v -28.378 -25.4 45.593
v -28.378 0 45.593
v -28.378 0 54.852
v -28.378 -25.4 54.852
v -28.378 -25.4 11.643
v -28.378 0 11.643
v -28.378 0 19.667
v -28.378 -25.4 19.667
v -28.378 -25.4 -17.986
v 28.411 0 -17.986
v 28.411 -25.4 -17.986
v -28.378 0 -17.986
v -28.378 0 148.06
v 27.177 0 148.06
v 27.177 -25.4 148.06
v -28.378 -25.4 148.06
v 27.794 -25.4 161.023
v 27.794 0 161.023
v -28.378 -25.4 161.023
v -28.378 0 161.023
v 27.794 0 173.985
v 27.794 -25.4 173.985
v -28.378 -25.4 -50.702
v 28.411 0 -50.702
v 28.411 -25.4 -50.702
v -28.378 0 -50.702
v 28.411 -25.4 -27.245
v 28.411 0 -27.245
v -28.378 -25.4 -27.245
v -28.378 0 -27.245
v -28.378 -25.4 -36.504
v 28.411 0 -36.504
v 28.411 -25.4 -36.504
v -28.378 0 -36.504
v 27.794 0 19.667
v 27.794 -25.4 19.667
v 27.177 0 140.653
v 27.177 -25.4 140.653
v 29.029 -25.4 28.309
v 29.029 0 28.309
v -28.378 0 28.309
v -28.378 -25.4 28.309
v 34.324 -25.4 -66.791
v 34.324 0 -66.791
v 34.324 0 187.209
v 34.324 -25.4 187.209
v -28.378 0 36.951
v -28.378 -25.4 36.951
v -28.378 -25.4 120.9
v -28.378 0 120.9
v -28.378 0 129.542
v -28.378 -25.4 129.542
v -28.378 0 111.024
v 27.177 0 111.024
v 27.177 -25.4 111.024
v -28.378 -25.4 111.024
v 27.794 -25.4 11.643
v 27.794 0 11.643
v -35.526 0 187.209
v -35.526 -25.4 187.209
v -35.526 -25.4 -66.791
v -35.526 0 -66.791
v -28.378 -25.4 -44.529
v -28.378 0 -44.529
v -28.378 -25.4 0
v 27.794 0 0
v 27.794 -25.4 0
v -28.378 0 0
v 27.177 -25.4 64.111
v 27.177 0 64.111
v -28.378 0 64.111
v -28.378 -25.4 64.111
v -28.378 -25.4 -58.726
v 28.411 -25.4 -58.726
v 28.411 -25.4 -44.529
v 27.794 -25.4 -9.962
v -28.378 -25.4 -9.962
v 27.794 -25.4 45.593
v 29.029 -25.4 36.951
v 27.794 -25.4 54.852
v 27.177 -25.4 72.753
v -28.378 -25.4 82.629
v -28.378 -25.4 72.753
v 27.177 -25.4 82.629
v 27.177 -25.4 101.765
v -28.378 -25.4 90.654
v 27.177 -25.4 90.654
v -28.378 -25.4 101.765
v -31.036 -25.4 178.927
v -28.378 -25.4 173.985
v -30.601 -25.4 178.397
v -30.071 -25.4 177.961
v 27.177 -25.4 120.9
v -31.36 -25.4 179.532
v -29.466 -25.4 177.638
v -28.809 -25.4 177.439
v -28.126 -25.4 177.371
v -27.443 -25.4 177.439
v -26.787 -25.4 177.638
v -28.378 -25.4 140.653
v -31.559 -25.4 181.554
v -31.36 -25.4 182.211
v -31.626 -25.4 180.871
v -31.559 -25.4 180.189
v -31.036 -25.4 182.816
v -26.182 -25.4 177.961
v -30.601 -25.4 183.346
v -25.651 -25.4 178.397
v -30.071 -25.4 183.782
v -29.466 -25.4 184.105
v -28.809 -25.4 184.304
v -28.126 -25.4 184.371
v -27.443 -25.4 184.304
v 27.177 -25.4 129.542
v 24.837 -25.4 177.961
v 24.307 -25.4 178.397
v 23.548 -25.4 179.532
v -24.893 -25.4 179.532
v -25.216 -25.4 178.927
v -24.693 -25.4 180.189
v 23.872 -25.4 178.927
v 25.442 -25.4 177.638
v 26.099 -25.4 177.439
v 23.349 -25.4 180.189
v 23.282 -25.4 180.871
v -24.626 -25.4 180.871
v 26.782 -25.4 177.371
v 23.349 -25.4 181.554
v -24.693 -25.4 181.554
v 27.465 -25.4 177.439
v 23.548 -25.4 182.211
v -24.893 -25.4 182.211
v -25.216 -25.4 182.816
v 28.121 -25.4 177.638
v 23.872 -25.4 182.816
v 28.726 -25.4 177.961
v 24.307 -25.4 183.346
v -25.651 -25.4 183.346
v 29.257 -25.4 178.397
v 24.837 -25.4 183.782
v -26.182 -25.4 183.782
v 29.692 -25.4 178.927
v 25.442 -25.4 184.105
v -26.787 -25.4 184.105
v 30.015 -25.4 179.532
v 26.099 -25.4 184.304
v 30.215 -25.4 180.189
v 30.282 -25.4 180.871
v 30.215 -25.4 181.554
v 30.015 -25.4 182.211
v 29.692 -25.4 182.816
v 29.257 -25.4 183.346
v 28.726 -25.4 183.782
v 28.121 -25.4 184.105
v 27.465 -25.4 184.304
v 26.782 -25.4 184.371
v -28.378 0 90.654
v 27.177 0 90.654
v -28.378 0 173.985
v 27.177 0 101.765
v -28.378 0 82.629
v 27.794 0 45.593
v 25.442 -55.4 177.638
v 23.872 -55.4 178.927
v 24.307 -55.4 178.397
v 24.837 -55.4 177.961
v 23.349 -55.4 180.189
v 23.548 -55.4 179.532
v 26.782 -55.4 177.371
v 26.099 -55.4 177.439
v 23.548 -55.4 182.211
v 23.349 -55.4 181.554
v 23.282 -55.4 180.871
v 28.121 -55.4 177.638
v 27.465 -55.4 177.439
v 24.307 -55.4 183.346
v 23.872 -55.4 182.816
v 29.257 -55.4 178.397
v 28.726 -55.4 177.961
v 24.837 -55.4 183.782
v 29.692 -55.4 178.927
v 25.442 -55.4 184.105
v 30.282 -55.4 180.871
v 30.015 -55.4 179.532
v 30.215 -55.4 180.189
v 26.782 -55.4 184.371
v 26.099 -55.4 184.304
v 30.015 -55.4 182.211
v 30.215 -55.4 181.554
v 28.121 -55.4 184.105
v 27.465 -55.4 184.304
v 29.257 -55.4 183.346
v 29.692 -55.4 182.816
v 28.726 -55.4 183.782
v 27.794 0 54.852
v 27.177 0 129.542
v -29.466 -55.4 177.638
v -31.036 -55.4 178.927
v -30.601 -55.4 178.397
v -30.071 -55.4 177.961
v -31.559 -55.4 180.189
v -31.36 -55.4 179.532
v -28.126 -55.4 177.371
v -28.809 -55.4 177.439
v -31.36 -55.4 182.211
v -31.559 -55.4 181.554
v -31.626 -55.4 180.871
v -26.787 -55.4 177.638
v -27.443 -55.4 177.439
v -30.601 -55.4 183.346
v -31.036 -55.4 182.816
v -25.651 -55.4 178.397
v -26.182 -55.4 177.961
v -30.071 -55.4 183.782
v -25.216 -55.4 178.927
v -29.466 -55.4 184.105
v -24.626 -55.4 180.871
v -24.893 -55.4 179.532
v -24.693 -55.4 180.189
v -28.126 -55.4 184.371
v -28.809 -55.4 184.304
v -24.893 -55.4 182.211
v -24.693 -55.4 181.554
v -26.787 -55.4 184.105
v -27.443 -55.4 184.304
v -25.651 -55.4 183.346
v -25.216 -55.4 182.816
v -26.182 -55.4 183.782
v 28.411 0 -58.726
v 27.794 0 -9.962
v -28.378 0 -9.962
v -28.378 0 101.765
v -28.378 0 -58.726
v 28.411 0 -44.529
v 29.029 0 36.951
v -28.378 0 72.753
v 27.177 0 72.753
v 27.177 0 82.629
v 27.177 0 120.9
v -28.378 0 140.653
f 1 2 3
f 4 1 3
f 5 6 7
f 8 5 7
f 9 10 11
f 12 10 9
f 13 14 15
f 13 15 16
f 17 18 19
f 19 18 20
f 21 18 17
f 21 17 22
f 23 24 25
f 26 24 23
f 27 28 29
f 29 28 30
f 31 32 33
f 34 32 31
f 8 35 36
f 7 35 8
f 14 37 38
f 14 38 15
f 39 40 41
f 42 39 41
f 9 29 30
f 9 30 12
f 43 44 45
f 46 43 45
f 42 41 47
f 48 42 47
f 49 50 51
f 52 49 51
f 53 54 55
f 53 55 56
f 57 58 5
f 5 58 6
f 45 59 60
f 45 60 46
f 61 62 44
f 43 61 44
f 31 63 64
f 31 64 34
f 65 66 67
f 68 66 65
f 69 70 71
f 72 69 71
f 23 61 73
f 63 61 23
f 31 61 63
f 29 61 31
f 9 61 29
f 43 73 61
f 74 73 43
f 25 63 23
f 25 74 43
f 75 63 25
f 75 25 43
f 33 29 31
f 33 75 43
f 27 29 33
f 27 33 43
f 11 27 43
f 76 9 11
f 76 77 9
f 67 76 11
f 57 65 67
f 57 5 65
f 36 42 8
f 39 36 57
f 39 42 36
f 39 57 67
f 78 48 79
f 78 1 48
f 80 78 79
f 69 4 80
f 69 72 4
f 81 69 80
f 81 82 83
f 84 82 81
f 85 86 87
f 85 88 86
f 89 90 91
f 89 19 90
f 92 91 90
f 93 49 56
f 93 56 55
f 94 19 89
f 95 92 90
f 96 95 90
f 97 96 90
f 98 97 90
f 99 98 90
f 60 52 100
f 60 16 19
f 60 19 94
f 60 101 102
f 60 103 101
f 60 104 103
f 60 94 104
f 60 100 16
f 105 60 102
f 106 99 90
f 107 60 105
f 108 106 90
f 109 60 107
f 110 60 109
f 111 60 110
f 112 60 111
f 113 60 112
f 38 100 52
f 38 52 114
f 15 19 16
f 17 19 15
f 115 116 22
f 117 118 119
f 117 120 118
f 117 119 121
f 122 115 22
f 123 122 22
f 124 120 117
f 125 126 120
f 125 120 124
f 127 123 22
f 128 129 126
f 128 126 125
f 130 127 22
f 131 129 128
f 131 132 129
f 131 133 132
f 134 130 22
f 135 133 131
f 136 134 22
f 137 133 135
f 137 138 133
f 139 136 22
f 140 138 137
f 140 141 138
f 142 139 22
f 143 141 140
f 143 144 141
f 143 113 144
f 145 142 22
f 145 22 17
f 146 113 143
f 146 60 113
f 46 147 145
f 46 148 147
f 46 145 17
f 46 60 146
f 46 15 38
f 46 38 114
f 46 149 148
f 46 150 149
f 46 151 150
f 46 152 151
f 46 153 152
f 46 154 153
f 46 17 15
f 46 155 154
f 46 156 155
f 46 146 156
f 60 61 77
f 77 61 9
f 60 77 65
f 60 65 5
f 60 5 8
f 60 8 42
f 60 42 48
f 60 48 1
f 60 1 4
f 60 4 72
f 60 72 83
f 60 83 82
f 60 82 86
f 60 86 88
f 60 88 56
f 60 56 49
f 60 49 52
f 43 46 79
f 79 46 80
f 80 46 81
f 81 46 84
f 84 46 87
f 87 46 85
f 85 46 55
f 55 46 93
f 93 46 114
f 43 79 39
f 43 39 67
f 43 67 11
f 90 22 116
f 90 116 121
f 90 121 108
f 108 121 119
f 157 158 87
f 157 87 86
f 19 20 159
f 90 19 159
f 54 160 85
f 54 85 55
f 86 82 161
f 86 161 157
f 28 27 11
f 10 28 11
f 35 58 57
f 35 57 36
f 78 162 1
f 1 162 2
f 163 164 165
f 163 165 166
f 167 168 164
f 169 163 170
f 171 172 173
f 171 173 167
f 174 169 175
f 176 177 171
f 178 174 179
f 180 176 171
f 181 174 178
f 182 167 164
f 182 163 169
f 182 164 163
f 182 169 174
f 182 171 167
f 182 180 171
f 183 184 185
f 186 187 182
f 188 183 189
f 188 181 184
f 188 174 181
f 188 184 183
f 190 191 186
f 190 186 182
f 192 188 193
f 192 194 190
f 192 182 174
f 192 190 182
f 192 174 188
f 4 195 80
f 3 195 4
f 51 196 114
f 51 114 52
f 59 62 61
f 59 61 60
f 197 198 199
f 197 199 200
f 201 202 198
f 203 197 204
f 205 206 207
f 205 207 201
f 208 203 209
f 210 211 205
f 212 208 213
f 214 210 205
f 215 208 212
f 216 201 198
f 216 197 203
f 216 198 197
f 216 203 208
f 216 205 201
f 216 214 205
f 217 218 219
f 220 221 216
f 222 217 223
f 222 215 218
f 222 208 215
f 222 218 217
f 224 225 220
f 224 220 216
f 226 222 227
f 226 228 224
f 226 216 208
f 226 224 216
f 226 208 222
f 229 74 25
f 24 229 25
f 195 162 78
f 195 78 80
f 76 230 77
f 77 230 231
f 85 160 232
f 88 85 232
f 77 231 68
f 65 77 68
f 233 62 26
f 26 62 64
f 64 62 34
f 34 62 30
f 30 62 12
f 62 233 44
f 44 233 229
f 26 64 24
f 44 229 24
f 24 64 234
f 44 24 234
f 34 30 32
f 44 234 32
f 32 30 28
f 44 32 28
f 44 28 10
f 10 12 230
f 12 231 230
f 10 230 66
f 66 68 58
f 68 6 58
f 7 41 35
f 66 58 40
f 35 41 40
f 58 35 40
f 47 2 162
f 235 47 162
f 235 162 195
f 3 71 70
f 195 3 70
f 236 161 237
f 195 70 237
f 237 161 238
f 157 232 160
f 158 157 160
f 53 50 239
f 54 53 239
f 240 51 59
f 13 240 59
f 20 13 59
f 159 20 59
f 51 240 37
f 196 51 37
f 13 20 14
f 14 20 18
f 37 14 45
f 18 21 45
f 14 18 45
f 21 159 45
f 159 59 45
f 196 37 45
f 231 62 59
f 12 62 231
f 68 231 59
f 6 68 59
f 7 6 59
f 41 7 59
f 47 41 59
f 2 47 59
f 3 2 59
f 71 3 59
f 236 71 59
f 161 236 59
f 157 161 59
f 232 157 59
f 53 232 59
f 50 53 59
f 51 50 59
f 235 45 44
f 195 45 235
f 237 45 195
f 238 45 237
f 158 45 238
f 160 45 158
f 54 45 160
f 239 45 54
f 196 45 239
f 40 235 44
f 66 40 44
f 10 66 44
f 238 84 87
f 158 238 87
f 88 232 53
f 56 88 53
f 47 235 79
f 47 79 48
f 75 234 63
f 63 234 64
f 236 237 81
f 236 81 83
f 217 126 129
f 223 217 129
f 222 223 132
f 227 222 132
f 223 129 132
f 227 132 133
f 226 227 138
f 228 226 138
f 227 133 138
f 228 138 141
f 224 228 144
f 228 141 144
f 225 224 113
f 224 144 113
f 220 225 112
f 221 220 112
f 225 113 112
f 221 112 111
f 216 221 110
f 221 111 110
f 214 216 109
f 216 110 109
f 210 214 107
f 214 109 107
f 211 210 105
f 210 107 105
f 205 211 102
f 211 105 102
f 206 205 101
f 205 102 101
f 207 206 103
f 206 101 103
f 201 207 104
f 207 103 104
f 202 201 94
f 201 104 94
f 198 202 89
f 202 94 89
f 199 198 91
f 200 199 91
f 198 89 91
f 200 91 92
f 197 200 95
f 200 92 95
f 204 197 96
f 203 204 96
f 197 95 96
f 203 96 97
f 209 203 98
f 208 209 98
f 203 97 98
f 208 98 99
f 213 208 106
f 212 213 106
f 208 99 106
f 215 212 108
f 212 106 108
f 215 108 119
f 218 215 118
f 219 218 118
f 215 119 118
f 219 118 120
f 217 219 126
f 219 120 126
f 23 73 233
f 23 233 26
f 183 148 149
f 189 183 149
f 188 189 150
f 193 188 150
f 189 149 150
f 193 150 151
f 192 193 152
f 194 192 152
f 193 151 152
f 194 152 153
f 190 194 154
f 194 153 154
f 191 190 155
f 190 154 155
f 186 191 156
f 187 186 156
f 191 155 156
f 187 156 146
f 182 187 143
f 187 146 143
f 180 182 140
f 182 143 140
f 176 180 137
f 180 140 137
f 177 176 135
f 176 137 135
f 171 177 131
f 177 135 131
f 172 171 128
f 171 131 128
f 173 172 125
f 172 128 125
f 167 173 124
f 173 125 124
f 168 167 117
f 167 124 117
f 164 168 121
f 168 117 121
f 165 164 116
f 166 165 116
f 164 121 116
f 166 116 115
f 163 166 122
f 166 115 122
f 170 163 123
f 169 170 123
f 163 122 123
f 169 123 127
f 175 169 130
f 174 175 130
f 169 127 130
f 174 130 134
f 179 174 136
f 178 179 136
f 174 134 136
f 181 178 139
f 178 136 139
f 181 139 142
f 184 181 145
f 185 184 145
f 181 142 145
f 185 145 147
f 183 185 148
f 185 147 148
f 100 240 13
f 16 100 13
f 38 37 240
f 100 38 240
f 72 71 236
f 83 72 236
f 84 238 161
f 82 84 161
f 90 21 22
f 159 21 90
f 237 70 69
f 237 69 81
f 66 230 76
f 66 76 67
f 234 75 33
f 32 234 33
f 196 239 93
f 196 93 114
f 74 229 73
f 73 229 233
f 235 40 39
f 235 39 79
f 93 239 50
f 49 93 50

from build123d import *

# Parameters (mm, degrees)
F0_W     = 69.85
F0_H     = 254
F1_DEPTH = 25.4
F2_W     = 55.55453
F2_H     = 7.407263
F2_H_2   = 8.641817
F2_H_3   = 9.25909
F2_H_4   = 8.024544
F2_W_2   = 56.171801
F2_H_5   = 9.259089
F2_W_3   = 57.406345
F2_H_6   = 8.641819
F2_H_7   = 8.024541
F2_H_8   = 9.961726
F2_W_4   = 56.789074
F2_H_9   = 9.25908
F2_H_10  = 8.02454
F2_H_11  = 12.962729
F3_DEPTH = 25.4
F4_R     = 3.5
F5_DEPTH = 30


with BuildPart() as f1:
    # F0 (on Front) → F1 (new body)
    with BuildSketch(Plane.XZ):
        with Locations((-0.601145, 60.209312)):
            Rectangle(F0_W, F0_H)
    extrude(amount=F1_DEPTH)

    # F2 (on face) → F3 (cut, through all)
    with BuildSketch(Plane(origin=(0, 0, 0), x_dir=(-1, 0, 0), z_dir=(0, 1, 0))):
        with Locations((0.600389, 144.356407)):
            Rectangle(F2_W, F2_H)
        with Locations((0.600389, 125.220966)):
            Rectangle(F2_W, F2_H_2)
        with Locations((0.600389, 106.394149)):
            Rectangle(F2_W, F2_H_3)
        with Locations((0.600389, 86.641431)):
            Rectangle(F2_W, F2_H_4)
        with Locations((0.600389, 68.431888)):
            Rectangle(F2_W, F2_H_2)
        with Locations((0.291754, 50.222348)):
            Rectangle(F2_W_2, F2_H_5)
        with Locations((-0.325518, 32.630081)):
            Rectangle(F2_W_3, F2_H_6)
        with Locations((0.291754, 15.655086)):
            Rectangle(F2_W_2, F2_H_7)
        with Locations((0.291754, -4.980863)):
            Rectangle(F2_W_2, F2_H_8)
        with Locations((-0.016883, -22.615812)):
            Rectangle(F2_W_4, F2_H_9)
        with Locations((-0.016883, -40.516714)):
            Rectangle(F2_W_4, F2_H_10)
        with Locations((-0.016883, -54.713981)):
            Rectangle(F2_W_4, F2_H_10)
        with Locations((0.291754, 167.504131)):
            Rectangle(F2_W_2, F2_H_11)
    extrude(amount=-F3_DEPTH, mode=Mode.SUBTRACT)

    # F4 (on face) → F5 (join)
    with BuildSketch(Plane.XZ.offset(25.4)):
        with Locations((-28.126128, 180.871427)):
            Circle(F4_R)
        with Locations((26.781848, 180.871427)):
            Circle(F4_R)
    extrude(amount=F5_DEPTH)


solid = f1.part
